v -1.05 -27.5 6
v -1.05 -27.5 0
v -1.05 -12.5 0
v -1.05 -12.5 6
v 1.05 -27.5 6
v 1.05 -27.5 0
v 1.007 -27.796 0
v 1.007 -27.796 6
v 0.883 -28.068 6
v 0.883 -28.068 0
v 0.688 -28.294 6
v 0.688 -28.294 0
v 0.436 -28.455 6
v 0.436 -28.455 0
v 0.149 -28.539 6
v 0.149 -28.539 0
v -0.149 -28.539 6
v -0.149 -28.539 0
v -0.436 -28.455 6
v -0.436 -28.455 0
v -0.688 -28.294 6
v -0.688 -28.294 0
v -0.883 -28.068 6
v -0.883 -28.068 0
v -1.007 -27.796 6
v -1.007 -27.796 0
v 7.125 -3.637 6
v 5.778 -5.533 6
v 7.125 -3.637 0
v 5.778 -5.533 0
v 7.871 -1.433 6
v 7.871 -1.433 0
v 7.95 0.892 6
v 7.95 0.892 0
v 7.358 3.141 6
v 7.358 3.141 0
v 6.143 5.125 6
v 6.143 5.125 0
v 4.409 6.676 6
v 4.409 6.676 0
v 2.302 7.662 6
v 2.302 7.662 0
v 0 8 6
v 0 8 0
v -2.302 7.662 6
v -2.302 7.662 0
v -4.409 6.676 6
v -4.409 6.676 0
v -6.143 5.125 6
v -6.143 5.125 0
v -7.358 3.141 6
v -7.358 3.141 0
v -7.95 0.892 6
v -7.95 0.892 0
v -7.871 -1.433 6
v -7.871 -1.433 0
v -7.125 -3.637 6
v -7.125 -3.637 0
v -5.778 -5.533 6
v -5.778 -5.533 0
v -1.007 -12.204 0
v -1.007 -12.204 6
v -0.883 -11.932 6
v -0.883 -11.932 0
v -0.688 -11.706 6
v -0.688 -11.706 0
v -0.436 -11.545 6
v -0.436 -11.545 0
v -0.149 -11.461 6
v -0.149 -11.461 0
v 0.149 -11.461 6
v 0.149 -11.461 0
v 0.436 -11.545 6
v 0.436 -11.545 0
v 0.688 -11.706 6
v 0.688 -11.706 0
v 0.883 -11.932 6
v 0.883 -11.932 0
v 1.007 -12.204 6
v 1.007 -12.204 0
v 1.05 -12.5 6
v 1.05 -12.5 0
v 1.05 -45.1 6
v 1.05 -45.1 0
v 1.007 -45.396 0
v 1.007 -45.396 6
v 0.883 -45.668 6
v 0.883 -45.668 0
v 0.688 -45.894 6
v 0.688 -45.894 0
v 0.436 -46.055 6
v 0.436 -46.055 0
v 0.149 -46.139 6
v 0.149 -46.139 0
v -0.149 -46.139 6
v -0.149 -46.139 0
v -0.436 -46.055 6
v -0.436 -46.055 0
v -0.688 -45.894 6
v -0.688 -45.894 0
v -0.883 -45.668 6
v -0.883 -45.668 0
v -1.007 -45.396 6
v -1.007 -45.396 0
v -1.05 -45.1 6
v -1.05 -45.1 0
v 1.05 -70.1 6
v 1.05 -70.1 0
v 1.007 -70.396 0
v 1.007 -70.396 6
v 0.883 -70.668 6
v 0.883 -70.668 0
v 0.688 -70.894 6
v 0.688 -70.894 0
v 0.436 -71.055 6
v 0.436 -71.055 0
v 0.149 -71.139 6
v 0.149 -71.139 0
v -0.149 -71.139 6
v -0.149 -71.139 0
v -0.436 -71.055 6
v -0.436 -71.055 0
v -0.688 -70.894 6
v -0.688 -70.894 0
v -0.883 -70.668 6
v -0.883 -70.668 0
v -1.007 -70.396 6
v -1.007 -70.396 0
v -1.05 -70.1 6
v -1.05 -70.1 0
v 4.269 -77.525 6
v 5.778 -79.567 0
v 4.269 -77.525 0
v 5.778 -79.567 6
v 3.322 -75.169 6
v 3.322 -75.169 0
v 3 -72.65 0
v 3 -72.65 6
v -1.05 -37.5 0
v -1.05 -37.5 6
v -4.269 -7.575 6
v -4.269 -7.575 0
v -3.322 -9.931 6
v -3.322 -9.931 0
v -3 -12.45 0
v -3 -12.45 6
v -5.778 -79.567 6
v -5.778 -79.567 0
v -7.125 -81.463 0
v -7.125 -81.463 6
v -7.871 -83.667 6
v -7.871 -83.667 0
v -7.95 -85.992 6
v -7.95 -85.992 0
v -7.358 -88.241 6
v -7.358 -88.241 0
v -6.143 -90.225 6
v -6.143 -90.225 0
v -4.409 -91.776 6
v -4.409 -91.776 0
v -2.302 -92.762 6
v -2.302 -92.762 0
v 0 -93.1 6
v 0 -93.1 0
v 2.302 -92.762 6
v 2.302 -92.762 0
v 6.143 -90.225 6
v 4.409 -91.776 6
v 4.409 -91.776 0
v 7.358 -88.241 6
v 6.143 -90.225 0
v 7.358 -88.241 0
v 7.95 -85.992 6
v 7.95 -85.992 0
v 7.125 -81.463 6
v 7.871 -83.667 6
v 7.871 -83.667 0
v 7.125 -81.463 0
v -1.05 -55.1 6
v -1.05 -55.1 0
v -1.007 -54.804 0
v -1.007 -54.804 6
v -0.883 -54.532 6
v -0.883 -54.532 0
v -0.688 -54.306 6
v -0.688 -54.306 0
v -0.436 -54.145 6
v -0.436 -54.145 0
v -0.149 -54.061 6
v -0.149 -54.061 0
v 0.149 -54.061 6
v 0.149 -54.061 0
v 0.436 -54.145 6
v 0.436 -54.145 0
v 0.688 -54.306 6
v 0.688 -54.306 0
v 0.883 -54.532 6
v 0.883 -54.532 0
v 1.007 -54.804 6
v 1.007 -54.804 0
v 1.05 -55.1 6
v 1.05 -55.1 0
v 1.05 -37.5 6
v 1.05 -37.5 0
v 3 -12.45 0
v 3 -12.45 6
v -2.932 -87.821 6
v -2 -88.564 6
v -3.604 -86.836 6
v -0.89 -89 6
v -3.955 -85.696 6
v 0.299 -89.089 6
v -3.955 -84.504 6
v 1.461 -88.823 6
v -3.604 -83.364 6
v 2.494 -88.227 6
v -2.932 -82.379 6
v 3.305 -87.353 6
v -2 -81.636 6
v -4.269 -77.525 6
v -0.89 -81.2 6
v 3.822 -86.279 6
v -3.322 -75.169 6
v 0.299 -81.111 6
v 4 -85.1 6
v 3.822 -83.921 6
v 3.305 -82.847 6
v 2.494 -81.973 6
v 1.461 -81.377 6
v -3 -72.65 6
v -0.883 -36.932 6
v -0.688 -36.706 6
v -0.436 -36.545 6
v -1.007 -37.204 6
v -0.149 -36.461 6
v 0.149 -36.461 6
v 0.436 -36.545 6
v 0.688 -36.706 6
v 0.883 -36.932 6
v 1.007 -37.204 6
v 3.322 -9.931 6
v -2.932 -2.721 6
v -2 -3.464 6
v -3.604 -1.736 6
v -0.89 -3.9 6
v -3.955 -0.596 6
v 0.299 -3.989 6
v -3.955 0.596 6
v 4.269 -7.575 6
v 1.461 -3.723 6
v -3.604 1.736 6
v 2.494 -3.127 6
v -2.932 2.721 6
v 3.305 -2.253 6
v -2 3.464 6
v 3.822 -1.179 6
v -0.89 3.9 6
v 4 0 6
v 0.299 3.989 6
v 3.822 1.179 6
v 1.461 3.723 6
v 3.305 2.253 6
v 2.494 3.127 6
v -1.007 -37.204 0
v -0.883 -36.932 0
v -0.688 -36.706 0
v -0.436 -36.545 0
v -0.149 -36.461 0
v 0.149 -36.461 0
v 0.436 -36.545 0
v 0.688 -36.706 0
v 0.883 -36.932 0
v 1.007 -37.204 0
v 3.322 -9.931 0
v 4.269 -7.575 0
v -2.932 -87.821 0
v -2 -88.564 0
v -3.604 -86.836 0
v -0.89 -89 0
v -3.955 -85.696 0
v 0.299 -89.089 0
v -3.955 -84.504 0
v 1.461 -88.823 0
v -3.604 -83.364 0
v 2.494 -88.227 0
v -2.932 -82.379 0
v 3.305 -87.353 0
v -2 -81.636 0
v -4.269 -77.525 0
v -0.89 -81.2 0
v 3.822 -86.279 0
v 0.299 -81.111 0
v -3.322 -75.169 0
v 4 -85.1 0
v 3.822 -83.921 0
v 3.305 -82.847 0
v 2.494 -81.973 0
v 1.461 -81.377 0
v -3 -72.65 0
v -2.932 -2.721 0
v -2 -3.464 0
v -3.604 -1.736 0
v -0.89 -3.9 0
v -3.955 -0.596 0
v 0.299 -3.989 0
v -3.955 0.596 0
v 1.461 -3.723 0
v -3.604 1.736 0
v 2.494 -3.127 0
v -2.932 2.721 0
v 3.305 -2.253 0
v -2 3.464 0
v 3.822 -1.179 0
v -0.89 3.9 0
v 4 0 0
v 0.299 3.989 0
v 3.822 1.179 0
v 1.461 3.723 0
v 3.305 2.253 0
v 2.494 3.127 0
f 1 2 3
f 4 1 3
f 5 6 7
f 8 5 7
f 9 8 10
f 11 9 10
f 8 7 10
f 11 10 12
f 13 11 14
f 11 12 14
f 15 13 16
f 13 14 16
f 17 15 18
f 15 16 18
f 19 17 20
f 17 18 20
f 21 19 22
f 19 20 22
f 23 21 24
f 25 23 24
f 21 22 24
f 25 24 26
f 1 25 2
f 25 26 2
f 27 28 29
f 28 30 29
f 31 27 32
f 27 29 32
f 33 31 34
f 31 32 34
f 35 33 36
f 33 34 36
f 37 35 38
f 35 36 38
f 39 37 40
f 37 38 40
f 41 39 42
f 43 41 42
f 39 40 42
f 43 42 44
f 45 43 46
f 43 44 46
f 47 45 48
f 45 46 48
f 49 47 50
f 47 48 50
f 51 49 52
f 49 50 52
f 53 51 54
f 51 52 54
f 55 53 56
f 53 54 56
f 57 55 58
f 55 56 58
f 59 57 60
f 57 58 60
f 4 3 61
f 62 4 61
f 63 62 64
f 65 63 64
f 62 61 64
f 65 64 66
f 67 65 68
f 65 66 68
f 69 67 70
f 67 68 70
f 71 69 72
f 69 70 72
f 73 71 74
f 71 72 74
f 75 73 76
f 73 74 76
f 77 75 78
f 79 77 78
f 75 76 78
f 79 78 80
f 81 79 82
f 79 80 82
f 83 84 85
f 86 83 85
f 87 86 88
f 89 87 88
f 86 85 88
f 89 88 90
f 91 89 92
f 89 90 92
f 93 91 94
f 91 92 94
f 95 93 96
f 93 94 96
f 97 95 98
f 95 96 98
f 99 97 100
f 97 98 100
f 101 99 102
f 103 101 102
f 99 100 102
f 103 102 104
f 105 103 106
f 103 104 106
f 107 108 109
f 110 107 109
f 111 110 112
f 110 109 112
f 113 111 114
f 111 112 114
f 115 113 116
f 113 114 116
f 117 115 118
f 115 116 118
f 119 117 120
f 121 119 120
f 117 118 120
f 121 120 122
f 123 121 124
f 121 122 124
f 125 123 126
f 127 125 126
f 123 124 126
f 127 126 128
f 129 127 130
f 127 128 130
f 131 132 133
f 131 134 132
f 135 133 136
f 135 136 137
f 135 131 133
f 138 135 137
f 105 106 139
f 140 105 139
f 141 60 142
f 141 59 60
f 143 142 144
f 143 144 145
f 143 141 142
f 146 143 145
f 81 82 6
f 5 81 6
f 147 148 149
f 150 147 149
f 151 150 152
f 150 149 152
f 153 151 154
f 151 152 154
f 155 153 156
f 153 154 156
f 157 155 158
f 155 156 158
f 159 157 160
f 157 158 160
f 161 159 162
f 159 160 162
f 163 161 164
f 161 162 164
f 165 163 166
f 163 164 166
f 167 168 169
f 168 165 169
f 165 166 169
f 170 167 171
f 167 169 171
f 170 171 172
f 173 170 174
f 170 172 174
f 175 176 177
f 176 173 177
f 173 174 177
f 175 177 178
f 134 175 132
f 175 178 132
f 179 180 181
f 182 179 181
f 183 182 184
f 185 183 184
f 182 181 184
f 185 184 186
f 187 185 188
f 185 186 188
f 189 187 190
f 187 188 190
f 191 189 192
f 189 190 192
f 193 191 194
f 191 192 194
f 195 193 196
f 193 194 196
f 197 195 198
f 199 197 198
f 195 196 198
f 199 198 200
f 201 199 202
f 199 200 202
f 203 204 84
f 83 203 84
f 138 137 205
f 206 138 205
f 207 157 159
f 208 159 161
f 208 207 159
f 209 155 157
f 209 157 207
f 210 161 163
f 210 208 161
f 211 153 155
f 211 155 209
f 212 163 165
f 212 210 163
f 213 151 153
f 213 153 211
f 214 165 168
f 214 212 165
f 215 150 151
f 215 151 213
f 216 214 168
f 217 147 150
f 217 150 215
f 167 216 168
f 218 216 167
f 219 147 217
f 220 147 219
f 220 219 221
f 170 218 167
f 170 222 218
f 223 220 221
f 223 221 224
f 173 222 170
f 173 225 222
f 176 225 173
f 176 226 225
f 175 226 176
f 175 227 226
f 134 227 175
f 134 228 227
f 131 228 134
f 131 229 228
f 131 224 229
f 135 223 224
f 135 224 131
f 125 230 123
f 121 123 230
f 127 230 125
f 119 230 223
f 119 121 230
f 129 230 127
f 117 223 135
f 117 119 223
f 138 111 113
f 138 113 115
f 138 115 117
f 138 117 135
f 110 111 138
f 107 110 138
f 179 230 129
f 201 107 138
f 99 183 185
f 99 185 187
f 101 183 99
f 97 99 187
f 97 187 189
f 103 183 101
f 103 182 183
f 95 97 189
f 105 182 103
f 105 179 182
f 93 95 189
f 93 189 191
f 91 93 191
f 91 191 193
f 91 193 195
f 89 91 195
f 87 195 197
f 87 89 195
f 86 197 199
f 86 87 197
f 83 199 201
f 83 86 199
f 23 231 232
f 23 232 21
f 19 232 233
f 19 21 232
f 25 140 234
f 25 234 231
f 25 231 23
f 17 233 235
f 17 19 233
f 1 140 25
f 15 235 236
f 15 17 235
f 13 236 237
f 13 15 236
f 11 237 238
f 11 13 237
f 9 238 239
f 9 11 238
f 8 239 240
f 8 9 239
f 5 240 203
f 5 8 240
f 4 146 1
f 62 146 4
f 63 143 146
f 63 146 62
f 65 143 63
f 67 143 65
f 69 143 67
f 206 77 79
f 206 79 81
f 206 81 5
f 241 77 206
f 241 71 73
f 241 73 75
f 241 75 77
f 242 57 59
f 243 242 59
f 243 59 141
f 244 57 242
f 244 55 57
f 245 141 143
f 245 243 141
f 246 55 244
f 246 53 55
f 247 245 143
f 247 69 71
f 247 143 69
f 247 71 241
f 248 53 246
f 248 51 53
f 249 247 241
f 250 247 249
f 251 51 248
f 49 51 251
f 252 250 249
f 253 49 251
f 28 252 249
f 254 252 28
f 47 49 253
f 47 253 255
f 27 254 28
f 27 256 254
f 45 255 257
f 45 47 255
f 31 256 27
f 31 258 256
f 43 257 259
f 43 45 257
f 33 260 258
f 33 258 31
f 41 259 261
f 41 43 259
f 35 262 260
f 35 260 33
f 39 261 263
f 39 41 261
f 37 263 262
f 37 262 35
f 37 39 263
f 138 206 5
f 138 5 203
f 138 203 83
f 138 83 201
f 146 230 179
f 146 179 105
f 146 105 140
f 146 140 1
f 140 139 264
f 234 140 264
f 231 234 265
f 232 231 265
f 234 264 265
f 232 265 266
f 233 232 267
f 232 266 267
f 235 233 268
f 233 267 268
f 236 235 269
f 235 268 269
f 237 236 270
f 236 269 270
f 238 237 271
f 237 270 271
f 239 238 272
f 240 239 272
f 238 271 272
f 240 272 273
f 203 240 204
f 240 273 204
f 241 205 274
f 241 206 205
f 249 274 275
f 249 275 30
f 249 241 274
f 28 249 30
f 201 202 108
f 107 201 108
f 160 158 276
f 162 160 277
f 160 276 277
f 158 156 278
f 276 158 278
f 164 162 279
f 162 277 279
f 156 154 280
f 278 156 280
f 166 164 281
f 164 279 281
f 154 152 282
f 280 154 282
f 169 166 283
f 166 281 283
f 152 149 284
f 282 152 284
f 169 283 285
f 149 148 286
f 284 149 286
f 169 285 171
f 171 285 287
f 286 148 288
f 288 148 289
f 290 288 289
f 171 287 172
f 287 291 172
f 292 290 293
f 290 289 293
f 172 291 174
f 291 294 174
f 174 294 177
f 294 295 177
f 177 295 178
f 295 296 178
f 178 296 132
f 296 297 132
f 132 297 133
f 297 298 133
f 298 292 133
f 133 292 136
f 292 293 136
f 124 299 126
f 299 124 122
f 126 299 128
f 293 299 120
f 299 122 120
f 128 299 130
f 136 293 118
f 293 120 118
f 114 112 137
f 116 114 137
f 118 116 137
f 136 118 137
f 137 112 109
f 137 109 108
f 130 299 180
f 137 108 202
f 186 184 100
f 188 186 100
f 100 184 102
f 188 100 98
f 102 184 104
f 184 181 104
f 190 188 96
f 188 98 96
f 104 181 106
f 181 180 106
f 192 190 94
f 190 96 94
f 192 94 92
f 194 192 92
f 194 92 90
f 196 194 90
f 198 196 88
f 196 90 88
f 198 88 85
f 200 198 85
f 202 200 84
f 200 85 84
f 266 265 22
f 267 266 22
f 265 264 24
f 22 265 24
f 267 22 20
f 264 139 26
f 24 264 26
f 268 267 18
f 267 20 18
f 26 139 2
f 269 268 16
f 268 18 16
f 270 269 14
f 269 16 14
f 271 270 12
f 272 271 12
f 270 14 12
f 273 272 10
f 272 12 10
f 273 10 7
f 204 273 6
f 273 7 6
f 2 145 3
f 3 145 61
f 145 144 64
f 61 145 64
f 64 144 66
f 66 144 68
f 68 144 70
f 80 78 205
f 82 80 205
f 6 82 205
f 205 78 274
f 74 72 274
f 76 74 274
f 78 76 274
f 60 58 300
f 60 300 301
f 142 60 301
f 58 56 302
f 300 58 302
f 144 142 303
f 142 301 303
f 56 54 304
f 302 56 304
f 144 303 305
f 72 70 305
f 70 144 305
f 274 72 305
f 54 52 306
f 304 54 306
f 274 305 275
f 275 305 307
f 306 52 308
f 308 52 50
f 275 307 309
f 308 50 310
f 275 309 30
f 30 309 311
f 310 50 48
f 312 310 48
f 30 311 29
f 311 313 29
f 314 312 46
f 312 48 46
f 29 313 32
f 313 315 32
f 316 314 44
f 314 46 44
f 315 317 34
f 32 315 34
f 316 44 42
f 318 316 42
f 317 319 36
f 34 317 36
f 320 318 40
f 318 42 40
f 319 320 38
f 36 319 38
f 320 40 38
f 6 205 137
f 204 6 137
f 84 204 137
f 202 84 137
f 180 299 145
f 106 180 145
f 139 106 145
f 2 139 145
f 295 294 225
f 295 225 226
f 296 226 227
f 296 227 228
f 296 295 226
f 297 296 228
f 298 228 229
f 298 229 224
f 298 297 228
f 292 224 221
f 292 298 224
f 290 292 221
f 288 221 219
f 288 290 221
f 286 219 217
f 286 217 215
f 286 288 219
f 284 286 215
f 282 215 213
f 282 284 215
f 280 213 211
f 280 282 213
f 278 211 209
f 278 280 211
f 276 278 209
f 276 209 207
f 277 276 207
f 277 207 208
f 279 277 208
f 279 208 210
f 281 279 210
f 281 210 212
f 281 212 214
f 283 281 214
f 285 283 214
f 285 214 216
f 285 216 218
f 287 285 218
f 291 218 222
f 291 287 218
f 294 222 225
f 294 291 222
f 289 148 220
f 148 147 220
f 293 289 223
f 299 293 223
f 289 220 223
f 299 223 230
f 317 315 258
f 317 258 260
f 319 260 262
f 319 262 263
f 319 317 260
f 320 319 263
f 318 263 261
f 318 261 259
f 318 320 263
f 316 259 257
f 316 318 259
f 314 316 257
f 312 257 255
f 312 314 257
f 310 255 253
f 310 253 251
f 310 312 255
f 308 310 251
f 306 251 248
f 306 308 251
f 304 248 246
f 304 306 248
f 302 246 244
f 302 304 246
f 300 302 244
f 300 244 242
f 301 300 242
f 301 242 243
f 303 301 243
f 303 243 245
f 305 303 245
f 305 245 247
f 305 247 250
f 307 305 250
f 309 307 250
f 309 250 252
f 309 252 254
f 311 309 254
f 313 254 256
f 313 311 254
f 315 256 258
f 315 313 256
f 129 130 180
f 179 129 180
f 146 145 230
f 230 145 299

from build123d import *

# Parameters (mm, degrees)
SKETCH_1_R      = 8
SKETCH_1_R_2    = 4
EXTRUDE_1_DEPTH = 6
FILLET_1_R      = 10


with BuildPart() as part:
    # 草图1 → 凸台-拉伸1 (new body)
    # profile 1 of 3: a face of its own
    with BuildSketch(Plane.XY):
        with BuildLine():
            ThreePointArc((3, -7.416198487), (0, -8), (-3, -7.416198487))
            Line((-3, -7.416198487), (-3, -77.683801513))
            ThreePointArc((-3, -77.683801513), (0, -77.1), (3, -77.683801513))
            Line((3, -77.683801513), (3, -7.416198487))
        make_face()
        with BuildLine():
            ThreePointArc((-1.05, -55.1), (0, -54.05), (1.05, -55.1))
            Line((1.05, -55.1), (1.05, -70.1))
            ThreePointArc((1.05, -70.1), (0, -71.15), (-1.05, -70.1))
            Line((-1.05, -70.1), (-1.05, -55.1))
        make_face(mode=Mode.SUBTRACT)
        with BuildLine():
            ThreePointArc((-1.05, -37.5), (0, -36.45), (1.05, -37.5))
            Line((1.05, -37.5), (1.05, -45.1))
            ThreePointArc((1.05, -45.1), (0, -46.15), (-1.05, -45.1))
            Line((-1.05, -45.1), (-1.05, -37.5))
        make_face(mode=Mode.SUBTRACT)
        with BuildLine():
            ThreePointArc((-1.05, -12.5), (0, -11.45), (1.05, -12.5))
            Line((1.05, -12.5), (1.05, -27.5))
            ThreePointArc((1.05, -27.5), (0, -28.55), (-1.05, -27.5))
            Line((-1.05, -27.5), (-1.05, -12.5))
        make_face(mode=Mode.SUBTRACT)
    # profile 2 of 3: a face of its own
    with BuildSketch(Plane.XY):
        Circle(SKETCH_1_R)
        Circle(SKETCH_1_R_2, mode=Mode.SUBTRACT)
    # profile 3 of 3: a face of its own
    with BuildSketch(Plane.XY):
        with Locations((0, -85.1)):
            Circle(SKETCH_1_R)
        with Locations((0, -85.1)):
            Circle(SKETCH_1_R_2, mode=Mode.SUBTRACT)
    extrude(amount=EXTRUDE_1_DEPTH)

    # 圆角1
    fillet_1_edges = [part.edges().sort_by_distance(p)[0] for p in [
        (3, -77.683801513, 3),
        (-3, -77.683801513, 3),
        (-3, -7.416198487, 3),
        (3, -7.416198487, 3),
    ]]
    fillet(fillet_1_edges, radius=FILLET_1_R)


solid = part.part
